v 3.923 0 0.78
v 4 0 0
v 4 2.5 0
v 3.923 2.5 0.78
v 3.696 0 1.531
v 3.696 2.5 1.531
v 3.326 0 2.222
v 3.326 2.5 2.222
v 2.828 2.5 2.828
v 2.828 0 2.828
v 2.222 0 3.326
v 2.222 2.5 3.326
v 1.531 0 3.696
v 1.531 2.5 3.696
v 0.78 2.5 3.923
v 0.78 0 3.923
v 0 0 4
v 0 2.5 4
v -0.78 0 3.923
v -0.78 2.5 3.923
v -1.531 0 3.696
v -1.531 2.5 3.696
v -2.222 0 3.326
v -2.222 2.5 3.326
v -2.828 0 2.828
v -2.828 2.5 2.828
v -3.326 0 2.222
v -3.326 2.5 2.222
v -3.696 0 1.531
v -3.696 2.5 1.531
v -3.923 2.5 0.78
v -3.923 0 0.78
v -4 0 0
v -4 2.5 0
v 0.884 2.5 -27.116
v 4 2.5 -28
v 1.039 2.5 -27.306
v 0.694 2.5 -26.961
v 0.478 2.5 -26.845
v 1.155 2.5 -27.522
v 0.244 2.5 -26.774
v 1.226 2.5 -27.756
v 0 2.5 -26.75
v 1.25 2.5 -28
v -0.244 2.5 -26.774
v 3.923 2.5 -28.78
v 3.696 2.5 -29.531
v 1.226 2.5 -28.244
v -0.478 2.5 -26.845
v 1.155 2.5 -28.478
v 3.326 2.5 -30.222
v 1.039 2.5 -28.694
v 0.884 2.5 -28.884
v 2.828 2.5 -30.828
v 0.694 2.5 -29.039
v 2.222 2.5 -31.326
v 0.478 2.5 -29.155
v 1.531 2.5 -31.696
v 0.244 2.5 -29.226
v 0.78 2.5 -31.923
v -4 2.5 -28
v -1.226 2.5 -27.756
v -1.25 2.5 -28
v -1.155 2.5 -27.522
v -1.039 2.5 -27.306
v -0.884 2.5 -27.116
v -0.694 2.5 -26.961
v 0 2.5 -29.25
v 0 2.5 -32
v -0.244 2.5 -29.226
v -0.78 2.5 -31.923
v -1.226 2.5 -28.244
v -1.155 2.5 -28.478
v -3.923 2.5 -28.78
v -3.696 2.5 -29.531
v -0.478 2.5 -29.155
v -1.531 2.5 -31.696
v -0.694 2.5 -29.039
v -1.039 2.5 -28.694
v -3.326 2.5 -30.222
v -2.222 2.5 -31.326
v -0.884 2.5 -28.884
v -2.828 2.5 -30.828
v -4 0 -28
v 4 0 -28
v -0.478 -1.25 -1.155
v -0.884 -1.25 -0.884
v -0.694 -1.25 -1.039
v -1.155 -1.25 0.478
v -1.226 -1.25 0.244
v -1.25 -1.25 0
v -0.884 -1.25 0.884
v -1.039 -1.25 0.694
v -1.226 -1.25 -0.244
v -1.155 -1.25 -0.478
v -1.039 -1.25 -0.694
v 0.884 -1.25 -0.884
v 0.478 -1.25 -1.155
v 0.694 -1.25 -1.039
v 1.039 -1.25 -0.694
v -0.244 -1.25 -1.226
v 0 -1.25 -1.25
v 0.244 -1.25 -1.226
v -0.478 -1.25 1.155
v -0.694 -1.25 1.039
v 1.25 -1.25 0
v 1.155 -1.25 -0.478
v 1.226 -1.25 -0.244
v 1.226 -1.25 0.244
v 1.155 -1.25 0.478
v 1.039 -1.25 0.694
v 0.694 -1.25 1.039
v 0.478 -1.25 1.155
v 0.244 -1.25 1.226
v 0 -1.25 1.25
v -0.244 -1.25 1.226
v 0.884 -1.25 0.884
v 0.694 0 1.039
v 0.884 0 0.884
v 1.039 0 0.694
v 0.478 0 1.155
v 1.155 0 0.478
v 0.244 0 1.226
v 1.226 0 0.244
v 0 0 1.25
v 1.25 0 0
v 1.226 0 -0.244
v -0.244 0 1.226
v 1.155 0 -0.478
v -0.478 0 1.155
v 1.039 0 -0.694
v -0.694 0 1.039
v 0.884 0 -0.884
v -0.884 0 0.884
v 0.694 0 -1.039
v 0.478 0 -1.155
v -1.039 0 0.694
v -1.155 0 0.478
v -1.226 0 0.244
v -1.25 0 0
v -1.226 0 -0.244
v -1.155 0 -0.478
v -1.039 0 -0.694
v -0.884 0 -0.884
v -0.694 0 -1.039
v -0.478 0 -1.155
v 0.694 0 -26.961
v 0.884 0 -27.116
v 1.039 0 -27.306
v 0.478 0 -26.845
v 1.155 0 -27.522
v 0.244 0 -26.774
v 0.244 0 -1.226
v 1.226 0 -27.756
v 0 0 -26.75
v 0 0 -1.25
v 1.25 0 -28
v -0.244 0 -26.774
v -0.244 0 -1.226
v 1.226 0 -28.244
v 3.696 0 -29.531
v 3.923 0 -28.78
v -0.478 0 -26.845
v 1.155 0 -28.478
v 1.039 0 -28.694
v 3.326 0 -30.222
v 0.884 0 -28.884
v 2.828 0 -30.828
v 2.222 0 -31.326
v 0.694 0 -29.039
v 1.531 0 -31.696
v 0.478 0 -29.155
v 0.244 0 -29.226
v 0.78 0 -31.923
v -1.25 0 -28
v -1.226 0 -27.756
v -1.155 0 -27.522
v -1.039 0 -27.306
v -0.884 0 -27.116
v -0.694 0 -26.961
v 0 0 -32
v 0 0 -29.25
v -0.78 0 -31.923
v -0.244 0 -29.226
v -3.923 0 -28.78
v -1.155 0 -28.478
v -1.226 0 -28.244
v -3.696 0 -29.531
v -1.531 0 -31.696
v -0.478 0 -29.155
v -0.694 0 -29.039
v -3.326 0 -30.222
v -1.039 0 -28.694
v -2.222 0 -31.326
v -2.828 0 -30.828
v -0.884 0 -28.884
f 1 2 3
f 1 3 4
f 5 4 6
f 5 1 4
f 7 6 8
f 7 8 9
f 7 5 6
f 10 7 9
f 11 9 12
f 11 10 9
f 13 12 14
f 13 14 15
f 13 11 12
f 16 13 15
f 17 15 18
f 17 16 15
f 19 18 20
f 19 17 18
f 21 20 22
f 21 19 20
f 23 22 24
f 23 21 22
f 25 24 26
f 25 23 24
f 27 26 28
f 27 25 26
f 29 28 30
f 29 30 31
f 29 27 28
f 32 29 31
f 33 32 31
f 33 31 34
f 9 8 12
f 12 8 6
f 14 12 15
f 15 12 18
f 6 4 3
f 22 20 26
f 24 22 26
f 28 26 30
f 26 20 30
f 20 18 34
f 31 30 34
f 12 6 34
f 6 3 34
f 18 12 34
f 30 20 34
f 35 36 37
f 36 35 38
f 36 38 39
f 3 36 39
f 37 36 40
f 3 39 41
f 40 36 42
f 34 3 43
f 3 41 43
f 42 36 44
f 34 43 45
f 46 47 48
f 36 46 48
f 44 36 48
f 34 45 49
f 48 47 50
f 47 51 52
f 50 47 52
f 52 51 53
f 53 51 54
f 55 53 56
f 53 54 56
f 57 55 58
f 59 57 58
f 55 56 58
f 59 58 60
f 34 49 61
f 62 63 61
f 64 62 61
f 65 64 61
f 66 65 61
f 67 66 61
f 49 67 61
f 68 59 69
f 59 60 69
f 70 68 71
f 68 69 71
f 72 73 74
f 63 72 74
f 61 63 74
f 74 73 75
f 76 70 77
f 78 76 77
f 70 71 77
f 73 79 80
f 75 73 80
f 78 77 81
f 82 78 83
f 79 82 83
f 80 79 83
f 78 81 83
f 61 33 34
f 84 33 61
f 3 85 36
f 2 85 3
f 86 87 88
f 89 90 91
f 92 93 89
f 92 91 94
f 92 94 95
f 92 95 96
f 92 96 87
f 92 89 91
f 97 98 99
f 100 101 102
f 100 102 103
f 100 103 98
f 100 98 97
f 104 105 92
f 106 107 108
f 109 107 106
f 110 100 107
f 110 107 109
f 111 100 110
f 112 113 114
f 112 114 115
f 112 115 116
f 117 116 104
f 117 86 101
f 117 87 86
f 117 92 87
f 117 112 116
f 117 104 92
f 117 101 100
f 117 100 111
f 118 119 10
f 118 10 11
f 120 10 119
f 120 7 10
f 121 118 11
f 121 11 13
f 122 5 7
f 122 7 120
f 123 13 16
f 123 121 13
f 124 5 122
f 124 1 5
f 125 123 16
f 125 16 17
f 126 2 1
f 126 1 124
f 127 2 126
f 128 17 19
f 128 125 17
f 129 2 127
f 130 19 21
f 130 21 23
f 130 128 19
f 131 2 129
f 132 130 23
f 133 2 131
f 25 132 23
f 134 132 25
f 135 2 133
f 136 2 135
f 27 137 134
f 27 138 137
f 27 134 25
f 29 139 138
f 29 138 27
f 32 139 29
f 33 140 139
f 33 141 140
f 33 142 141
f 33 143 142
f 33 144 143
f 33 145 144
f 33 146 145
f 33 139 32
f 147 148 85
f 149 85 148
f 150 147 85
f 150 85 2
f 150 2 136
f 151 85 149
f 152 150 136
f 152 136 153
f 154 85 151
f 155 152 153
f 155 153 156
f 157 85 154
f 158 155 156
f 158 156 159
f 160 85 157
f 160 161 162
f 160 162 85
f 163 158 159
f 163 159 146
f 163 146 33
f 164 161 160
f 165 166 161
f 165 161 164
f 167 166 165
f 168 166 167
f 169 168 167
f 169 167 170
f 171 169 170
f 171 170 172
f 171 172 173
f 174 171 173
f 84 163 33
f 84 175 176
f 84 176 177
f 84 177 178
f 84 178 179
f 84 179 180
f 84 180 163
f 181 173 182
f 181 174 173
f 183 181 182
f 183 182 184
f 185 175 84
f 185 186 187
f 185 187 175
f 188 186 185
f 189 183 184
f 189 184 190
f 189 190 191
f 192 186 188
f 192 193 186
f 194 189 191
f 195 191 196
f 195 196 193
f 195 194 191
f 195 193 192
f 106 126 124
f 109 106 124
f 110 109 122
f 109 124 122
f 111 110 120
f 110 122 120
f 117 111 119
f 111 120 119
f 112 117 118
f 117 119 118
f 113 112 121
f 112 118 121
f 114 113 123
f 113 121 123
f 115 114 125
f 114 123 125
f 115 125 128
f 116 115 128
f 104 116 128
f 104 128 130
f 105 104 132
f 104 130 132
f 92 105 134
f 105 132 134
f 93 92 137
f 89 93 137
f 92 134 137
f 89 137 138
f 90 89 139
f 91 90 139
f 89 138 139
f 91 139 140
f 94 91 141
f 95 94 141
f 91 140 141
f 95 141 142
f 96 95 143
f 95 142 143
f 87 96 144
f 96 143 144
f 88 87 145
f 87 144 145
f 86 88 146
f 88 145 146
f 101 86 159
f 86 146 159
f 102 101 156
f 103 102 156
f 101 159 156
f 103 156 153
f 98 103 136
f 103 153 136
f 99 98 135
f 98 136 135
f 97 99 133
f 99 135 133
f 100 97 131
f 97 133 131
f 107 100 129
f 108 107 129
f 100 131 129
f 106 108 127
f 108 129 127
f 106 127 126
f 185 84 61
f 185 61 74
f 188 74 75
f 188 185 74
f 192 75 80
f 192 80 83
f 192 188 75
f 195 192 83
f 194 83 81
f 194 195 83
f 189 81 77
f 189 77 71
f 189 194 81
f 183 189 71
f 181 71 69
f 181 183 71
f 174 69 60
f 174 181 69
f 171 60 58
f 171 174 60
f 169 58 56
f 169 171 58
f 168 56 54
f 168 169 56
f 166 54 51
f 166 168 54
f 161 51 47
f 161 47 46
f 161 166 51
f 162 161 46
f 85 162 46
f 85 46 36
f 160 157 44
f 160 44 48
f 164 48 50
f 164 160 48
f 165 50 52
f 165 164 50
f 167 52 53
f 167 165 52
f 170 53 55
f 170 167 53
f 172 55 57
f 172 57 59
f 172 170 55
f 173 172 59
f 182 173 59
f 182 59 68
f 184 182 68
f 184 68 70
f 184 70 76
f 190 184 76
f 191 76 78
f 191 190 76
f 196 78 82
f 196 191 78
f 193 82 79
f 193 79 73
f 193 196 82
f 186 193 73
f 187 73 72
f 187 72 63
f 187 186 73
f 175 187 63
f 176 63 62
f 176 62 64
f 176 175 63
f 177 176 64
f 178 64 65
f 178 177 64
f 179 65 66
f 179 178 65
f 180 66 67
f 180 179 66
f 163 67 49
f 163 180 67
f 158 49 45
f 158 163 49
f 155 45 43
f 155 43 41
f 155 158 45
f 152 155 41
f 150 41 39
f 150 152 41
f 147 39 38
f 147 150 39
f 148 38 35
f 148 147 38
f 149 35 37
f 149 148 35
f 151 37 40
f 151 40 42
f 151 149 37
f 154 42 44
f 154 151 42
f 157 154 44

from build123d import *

# Parameters (mm, degrees)
SKETCH1_R           = 1.25
BOSS_EXTRUDE1_DEPTH = 2.5
SKETCH2_R           = 1.25
BOSS_EXTRUDE2_DEPTH = 1.25


with BuildPart() as part:
    # Sketch1 → Boss-Extrude1 (new body)
    with BuildSketch(Plane(origin=(0, 0, 0), x_dir=(1, 0, 0), z_dir=(0, 1, 0))):
        with BuildLine():
            Line((-4, 0), (-4, 28))
            ThreePointArc((-4, 28), (0, 32), (4, 28))
            Line((4, 28), (4, 0))
            ThreePointArc((4, 0), (0, -4), (-4, 0))
        make_face()
        with Locations((0, 28)):
            Circle(SKETCH1_R, mode=Mode.SUBTRACT)
    extrude(amount=BOSS_EXTRUDE1_DEPTH)

    # Sketch2 → Boss-Extrude2 (add)
    with BuildSketch(Plane.XZ):
        Circle(SKETCH2_R)
    extrude(amount=BOSS_EXTRUDE2_DEPTH)


solid = part.part
